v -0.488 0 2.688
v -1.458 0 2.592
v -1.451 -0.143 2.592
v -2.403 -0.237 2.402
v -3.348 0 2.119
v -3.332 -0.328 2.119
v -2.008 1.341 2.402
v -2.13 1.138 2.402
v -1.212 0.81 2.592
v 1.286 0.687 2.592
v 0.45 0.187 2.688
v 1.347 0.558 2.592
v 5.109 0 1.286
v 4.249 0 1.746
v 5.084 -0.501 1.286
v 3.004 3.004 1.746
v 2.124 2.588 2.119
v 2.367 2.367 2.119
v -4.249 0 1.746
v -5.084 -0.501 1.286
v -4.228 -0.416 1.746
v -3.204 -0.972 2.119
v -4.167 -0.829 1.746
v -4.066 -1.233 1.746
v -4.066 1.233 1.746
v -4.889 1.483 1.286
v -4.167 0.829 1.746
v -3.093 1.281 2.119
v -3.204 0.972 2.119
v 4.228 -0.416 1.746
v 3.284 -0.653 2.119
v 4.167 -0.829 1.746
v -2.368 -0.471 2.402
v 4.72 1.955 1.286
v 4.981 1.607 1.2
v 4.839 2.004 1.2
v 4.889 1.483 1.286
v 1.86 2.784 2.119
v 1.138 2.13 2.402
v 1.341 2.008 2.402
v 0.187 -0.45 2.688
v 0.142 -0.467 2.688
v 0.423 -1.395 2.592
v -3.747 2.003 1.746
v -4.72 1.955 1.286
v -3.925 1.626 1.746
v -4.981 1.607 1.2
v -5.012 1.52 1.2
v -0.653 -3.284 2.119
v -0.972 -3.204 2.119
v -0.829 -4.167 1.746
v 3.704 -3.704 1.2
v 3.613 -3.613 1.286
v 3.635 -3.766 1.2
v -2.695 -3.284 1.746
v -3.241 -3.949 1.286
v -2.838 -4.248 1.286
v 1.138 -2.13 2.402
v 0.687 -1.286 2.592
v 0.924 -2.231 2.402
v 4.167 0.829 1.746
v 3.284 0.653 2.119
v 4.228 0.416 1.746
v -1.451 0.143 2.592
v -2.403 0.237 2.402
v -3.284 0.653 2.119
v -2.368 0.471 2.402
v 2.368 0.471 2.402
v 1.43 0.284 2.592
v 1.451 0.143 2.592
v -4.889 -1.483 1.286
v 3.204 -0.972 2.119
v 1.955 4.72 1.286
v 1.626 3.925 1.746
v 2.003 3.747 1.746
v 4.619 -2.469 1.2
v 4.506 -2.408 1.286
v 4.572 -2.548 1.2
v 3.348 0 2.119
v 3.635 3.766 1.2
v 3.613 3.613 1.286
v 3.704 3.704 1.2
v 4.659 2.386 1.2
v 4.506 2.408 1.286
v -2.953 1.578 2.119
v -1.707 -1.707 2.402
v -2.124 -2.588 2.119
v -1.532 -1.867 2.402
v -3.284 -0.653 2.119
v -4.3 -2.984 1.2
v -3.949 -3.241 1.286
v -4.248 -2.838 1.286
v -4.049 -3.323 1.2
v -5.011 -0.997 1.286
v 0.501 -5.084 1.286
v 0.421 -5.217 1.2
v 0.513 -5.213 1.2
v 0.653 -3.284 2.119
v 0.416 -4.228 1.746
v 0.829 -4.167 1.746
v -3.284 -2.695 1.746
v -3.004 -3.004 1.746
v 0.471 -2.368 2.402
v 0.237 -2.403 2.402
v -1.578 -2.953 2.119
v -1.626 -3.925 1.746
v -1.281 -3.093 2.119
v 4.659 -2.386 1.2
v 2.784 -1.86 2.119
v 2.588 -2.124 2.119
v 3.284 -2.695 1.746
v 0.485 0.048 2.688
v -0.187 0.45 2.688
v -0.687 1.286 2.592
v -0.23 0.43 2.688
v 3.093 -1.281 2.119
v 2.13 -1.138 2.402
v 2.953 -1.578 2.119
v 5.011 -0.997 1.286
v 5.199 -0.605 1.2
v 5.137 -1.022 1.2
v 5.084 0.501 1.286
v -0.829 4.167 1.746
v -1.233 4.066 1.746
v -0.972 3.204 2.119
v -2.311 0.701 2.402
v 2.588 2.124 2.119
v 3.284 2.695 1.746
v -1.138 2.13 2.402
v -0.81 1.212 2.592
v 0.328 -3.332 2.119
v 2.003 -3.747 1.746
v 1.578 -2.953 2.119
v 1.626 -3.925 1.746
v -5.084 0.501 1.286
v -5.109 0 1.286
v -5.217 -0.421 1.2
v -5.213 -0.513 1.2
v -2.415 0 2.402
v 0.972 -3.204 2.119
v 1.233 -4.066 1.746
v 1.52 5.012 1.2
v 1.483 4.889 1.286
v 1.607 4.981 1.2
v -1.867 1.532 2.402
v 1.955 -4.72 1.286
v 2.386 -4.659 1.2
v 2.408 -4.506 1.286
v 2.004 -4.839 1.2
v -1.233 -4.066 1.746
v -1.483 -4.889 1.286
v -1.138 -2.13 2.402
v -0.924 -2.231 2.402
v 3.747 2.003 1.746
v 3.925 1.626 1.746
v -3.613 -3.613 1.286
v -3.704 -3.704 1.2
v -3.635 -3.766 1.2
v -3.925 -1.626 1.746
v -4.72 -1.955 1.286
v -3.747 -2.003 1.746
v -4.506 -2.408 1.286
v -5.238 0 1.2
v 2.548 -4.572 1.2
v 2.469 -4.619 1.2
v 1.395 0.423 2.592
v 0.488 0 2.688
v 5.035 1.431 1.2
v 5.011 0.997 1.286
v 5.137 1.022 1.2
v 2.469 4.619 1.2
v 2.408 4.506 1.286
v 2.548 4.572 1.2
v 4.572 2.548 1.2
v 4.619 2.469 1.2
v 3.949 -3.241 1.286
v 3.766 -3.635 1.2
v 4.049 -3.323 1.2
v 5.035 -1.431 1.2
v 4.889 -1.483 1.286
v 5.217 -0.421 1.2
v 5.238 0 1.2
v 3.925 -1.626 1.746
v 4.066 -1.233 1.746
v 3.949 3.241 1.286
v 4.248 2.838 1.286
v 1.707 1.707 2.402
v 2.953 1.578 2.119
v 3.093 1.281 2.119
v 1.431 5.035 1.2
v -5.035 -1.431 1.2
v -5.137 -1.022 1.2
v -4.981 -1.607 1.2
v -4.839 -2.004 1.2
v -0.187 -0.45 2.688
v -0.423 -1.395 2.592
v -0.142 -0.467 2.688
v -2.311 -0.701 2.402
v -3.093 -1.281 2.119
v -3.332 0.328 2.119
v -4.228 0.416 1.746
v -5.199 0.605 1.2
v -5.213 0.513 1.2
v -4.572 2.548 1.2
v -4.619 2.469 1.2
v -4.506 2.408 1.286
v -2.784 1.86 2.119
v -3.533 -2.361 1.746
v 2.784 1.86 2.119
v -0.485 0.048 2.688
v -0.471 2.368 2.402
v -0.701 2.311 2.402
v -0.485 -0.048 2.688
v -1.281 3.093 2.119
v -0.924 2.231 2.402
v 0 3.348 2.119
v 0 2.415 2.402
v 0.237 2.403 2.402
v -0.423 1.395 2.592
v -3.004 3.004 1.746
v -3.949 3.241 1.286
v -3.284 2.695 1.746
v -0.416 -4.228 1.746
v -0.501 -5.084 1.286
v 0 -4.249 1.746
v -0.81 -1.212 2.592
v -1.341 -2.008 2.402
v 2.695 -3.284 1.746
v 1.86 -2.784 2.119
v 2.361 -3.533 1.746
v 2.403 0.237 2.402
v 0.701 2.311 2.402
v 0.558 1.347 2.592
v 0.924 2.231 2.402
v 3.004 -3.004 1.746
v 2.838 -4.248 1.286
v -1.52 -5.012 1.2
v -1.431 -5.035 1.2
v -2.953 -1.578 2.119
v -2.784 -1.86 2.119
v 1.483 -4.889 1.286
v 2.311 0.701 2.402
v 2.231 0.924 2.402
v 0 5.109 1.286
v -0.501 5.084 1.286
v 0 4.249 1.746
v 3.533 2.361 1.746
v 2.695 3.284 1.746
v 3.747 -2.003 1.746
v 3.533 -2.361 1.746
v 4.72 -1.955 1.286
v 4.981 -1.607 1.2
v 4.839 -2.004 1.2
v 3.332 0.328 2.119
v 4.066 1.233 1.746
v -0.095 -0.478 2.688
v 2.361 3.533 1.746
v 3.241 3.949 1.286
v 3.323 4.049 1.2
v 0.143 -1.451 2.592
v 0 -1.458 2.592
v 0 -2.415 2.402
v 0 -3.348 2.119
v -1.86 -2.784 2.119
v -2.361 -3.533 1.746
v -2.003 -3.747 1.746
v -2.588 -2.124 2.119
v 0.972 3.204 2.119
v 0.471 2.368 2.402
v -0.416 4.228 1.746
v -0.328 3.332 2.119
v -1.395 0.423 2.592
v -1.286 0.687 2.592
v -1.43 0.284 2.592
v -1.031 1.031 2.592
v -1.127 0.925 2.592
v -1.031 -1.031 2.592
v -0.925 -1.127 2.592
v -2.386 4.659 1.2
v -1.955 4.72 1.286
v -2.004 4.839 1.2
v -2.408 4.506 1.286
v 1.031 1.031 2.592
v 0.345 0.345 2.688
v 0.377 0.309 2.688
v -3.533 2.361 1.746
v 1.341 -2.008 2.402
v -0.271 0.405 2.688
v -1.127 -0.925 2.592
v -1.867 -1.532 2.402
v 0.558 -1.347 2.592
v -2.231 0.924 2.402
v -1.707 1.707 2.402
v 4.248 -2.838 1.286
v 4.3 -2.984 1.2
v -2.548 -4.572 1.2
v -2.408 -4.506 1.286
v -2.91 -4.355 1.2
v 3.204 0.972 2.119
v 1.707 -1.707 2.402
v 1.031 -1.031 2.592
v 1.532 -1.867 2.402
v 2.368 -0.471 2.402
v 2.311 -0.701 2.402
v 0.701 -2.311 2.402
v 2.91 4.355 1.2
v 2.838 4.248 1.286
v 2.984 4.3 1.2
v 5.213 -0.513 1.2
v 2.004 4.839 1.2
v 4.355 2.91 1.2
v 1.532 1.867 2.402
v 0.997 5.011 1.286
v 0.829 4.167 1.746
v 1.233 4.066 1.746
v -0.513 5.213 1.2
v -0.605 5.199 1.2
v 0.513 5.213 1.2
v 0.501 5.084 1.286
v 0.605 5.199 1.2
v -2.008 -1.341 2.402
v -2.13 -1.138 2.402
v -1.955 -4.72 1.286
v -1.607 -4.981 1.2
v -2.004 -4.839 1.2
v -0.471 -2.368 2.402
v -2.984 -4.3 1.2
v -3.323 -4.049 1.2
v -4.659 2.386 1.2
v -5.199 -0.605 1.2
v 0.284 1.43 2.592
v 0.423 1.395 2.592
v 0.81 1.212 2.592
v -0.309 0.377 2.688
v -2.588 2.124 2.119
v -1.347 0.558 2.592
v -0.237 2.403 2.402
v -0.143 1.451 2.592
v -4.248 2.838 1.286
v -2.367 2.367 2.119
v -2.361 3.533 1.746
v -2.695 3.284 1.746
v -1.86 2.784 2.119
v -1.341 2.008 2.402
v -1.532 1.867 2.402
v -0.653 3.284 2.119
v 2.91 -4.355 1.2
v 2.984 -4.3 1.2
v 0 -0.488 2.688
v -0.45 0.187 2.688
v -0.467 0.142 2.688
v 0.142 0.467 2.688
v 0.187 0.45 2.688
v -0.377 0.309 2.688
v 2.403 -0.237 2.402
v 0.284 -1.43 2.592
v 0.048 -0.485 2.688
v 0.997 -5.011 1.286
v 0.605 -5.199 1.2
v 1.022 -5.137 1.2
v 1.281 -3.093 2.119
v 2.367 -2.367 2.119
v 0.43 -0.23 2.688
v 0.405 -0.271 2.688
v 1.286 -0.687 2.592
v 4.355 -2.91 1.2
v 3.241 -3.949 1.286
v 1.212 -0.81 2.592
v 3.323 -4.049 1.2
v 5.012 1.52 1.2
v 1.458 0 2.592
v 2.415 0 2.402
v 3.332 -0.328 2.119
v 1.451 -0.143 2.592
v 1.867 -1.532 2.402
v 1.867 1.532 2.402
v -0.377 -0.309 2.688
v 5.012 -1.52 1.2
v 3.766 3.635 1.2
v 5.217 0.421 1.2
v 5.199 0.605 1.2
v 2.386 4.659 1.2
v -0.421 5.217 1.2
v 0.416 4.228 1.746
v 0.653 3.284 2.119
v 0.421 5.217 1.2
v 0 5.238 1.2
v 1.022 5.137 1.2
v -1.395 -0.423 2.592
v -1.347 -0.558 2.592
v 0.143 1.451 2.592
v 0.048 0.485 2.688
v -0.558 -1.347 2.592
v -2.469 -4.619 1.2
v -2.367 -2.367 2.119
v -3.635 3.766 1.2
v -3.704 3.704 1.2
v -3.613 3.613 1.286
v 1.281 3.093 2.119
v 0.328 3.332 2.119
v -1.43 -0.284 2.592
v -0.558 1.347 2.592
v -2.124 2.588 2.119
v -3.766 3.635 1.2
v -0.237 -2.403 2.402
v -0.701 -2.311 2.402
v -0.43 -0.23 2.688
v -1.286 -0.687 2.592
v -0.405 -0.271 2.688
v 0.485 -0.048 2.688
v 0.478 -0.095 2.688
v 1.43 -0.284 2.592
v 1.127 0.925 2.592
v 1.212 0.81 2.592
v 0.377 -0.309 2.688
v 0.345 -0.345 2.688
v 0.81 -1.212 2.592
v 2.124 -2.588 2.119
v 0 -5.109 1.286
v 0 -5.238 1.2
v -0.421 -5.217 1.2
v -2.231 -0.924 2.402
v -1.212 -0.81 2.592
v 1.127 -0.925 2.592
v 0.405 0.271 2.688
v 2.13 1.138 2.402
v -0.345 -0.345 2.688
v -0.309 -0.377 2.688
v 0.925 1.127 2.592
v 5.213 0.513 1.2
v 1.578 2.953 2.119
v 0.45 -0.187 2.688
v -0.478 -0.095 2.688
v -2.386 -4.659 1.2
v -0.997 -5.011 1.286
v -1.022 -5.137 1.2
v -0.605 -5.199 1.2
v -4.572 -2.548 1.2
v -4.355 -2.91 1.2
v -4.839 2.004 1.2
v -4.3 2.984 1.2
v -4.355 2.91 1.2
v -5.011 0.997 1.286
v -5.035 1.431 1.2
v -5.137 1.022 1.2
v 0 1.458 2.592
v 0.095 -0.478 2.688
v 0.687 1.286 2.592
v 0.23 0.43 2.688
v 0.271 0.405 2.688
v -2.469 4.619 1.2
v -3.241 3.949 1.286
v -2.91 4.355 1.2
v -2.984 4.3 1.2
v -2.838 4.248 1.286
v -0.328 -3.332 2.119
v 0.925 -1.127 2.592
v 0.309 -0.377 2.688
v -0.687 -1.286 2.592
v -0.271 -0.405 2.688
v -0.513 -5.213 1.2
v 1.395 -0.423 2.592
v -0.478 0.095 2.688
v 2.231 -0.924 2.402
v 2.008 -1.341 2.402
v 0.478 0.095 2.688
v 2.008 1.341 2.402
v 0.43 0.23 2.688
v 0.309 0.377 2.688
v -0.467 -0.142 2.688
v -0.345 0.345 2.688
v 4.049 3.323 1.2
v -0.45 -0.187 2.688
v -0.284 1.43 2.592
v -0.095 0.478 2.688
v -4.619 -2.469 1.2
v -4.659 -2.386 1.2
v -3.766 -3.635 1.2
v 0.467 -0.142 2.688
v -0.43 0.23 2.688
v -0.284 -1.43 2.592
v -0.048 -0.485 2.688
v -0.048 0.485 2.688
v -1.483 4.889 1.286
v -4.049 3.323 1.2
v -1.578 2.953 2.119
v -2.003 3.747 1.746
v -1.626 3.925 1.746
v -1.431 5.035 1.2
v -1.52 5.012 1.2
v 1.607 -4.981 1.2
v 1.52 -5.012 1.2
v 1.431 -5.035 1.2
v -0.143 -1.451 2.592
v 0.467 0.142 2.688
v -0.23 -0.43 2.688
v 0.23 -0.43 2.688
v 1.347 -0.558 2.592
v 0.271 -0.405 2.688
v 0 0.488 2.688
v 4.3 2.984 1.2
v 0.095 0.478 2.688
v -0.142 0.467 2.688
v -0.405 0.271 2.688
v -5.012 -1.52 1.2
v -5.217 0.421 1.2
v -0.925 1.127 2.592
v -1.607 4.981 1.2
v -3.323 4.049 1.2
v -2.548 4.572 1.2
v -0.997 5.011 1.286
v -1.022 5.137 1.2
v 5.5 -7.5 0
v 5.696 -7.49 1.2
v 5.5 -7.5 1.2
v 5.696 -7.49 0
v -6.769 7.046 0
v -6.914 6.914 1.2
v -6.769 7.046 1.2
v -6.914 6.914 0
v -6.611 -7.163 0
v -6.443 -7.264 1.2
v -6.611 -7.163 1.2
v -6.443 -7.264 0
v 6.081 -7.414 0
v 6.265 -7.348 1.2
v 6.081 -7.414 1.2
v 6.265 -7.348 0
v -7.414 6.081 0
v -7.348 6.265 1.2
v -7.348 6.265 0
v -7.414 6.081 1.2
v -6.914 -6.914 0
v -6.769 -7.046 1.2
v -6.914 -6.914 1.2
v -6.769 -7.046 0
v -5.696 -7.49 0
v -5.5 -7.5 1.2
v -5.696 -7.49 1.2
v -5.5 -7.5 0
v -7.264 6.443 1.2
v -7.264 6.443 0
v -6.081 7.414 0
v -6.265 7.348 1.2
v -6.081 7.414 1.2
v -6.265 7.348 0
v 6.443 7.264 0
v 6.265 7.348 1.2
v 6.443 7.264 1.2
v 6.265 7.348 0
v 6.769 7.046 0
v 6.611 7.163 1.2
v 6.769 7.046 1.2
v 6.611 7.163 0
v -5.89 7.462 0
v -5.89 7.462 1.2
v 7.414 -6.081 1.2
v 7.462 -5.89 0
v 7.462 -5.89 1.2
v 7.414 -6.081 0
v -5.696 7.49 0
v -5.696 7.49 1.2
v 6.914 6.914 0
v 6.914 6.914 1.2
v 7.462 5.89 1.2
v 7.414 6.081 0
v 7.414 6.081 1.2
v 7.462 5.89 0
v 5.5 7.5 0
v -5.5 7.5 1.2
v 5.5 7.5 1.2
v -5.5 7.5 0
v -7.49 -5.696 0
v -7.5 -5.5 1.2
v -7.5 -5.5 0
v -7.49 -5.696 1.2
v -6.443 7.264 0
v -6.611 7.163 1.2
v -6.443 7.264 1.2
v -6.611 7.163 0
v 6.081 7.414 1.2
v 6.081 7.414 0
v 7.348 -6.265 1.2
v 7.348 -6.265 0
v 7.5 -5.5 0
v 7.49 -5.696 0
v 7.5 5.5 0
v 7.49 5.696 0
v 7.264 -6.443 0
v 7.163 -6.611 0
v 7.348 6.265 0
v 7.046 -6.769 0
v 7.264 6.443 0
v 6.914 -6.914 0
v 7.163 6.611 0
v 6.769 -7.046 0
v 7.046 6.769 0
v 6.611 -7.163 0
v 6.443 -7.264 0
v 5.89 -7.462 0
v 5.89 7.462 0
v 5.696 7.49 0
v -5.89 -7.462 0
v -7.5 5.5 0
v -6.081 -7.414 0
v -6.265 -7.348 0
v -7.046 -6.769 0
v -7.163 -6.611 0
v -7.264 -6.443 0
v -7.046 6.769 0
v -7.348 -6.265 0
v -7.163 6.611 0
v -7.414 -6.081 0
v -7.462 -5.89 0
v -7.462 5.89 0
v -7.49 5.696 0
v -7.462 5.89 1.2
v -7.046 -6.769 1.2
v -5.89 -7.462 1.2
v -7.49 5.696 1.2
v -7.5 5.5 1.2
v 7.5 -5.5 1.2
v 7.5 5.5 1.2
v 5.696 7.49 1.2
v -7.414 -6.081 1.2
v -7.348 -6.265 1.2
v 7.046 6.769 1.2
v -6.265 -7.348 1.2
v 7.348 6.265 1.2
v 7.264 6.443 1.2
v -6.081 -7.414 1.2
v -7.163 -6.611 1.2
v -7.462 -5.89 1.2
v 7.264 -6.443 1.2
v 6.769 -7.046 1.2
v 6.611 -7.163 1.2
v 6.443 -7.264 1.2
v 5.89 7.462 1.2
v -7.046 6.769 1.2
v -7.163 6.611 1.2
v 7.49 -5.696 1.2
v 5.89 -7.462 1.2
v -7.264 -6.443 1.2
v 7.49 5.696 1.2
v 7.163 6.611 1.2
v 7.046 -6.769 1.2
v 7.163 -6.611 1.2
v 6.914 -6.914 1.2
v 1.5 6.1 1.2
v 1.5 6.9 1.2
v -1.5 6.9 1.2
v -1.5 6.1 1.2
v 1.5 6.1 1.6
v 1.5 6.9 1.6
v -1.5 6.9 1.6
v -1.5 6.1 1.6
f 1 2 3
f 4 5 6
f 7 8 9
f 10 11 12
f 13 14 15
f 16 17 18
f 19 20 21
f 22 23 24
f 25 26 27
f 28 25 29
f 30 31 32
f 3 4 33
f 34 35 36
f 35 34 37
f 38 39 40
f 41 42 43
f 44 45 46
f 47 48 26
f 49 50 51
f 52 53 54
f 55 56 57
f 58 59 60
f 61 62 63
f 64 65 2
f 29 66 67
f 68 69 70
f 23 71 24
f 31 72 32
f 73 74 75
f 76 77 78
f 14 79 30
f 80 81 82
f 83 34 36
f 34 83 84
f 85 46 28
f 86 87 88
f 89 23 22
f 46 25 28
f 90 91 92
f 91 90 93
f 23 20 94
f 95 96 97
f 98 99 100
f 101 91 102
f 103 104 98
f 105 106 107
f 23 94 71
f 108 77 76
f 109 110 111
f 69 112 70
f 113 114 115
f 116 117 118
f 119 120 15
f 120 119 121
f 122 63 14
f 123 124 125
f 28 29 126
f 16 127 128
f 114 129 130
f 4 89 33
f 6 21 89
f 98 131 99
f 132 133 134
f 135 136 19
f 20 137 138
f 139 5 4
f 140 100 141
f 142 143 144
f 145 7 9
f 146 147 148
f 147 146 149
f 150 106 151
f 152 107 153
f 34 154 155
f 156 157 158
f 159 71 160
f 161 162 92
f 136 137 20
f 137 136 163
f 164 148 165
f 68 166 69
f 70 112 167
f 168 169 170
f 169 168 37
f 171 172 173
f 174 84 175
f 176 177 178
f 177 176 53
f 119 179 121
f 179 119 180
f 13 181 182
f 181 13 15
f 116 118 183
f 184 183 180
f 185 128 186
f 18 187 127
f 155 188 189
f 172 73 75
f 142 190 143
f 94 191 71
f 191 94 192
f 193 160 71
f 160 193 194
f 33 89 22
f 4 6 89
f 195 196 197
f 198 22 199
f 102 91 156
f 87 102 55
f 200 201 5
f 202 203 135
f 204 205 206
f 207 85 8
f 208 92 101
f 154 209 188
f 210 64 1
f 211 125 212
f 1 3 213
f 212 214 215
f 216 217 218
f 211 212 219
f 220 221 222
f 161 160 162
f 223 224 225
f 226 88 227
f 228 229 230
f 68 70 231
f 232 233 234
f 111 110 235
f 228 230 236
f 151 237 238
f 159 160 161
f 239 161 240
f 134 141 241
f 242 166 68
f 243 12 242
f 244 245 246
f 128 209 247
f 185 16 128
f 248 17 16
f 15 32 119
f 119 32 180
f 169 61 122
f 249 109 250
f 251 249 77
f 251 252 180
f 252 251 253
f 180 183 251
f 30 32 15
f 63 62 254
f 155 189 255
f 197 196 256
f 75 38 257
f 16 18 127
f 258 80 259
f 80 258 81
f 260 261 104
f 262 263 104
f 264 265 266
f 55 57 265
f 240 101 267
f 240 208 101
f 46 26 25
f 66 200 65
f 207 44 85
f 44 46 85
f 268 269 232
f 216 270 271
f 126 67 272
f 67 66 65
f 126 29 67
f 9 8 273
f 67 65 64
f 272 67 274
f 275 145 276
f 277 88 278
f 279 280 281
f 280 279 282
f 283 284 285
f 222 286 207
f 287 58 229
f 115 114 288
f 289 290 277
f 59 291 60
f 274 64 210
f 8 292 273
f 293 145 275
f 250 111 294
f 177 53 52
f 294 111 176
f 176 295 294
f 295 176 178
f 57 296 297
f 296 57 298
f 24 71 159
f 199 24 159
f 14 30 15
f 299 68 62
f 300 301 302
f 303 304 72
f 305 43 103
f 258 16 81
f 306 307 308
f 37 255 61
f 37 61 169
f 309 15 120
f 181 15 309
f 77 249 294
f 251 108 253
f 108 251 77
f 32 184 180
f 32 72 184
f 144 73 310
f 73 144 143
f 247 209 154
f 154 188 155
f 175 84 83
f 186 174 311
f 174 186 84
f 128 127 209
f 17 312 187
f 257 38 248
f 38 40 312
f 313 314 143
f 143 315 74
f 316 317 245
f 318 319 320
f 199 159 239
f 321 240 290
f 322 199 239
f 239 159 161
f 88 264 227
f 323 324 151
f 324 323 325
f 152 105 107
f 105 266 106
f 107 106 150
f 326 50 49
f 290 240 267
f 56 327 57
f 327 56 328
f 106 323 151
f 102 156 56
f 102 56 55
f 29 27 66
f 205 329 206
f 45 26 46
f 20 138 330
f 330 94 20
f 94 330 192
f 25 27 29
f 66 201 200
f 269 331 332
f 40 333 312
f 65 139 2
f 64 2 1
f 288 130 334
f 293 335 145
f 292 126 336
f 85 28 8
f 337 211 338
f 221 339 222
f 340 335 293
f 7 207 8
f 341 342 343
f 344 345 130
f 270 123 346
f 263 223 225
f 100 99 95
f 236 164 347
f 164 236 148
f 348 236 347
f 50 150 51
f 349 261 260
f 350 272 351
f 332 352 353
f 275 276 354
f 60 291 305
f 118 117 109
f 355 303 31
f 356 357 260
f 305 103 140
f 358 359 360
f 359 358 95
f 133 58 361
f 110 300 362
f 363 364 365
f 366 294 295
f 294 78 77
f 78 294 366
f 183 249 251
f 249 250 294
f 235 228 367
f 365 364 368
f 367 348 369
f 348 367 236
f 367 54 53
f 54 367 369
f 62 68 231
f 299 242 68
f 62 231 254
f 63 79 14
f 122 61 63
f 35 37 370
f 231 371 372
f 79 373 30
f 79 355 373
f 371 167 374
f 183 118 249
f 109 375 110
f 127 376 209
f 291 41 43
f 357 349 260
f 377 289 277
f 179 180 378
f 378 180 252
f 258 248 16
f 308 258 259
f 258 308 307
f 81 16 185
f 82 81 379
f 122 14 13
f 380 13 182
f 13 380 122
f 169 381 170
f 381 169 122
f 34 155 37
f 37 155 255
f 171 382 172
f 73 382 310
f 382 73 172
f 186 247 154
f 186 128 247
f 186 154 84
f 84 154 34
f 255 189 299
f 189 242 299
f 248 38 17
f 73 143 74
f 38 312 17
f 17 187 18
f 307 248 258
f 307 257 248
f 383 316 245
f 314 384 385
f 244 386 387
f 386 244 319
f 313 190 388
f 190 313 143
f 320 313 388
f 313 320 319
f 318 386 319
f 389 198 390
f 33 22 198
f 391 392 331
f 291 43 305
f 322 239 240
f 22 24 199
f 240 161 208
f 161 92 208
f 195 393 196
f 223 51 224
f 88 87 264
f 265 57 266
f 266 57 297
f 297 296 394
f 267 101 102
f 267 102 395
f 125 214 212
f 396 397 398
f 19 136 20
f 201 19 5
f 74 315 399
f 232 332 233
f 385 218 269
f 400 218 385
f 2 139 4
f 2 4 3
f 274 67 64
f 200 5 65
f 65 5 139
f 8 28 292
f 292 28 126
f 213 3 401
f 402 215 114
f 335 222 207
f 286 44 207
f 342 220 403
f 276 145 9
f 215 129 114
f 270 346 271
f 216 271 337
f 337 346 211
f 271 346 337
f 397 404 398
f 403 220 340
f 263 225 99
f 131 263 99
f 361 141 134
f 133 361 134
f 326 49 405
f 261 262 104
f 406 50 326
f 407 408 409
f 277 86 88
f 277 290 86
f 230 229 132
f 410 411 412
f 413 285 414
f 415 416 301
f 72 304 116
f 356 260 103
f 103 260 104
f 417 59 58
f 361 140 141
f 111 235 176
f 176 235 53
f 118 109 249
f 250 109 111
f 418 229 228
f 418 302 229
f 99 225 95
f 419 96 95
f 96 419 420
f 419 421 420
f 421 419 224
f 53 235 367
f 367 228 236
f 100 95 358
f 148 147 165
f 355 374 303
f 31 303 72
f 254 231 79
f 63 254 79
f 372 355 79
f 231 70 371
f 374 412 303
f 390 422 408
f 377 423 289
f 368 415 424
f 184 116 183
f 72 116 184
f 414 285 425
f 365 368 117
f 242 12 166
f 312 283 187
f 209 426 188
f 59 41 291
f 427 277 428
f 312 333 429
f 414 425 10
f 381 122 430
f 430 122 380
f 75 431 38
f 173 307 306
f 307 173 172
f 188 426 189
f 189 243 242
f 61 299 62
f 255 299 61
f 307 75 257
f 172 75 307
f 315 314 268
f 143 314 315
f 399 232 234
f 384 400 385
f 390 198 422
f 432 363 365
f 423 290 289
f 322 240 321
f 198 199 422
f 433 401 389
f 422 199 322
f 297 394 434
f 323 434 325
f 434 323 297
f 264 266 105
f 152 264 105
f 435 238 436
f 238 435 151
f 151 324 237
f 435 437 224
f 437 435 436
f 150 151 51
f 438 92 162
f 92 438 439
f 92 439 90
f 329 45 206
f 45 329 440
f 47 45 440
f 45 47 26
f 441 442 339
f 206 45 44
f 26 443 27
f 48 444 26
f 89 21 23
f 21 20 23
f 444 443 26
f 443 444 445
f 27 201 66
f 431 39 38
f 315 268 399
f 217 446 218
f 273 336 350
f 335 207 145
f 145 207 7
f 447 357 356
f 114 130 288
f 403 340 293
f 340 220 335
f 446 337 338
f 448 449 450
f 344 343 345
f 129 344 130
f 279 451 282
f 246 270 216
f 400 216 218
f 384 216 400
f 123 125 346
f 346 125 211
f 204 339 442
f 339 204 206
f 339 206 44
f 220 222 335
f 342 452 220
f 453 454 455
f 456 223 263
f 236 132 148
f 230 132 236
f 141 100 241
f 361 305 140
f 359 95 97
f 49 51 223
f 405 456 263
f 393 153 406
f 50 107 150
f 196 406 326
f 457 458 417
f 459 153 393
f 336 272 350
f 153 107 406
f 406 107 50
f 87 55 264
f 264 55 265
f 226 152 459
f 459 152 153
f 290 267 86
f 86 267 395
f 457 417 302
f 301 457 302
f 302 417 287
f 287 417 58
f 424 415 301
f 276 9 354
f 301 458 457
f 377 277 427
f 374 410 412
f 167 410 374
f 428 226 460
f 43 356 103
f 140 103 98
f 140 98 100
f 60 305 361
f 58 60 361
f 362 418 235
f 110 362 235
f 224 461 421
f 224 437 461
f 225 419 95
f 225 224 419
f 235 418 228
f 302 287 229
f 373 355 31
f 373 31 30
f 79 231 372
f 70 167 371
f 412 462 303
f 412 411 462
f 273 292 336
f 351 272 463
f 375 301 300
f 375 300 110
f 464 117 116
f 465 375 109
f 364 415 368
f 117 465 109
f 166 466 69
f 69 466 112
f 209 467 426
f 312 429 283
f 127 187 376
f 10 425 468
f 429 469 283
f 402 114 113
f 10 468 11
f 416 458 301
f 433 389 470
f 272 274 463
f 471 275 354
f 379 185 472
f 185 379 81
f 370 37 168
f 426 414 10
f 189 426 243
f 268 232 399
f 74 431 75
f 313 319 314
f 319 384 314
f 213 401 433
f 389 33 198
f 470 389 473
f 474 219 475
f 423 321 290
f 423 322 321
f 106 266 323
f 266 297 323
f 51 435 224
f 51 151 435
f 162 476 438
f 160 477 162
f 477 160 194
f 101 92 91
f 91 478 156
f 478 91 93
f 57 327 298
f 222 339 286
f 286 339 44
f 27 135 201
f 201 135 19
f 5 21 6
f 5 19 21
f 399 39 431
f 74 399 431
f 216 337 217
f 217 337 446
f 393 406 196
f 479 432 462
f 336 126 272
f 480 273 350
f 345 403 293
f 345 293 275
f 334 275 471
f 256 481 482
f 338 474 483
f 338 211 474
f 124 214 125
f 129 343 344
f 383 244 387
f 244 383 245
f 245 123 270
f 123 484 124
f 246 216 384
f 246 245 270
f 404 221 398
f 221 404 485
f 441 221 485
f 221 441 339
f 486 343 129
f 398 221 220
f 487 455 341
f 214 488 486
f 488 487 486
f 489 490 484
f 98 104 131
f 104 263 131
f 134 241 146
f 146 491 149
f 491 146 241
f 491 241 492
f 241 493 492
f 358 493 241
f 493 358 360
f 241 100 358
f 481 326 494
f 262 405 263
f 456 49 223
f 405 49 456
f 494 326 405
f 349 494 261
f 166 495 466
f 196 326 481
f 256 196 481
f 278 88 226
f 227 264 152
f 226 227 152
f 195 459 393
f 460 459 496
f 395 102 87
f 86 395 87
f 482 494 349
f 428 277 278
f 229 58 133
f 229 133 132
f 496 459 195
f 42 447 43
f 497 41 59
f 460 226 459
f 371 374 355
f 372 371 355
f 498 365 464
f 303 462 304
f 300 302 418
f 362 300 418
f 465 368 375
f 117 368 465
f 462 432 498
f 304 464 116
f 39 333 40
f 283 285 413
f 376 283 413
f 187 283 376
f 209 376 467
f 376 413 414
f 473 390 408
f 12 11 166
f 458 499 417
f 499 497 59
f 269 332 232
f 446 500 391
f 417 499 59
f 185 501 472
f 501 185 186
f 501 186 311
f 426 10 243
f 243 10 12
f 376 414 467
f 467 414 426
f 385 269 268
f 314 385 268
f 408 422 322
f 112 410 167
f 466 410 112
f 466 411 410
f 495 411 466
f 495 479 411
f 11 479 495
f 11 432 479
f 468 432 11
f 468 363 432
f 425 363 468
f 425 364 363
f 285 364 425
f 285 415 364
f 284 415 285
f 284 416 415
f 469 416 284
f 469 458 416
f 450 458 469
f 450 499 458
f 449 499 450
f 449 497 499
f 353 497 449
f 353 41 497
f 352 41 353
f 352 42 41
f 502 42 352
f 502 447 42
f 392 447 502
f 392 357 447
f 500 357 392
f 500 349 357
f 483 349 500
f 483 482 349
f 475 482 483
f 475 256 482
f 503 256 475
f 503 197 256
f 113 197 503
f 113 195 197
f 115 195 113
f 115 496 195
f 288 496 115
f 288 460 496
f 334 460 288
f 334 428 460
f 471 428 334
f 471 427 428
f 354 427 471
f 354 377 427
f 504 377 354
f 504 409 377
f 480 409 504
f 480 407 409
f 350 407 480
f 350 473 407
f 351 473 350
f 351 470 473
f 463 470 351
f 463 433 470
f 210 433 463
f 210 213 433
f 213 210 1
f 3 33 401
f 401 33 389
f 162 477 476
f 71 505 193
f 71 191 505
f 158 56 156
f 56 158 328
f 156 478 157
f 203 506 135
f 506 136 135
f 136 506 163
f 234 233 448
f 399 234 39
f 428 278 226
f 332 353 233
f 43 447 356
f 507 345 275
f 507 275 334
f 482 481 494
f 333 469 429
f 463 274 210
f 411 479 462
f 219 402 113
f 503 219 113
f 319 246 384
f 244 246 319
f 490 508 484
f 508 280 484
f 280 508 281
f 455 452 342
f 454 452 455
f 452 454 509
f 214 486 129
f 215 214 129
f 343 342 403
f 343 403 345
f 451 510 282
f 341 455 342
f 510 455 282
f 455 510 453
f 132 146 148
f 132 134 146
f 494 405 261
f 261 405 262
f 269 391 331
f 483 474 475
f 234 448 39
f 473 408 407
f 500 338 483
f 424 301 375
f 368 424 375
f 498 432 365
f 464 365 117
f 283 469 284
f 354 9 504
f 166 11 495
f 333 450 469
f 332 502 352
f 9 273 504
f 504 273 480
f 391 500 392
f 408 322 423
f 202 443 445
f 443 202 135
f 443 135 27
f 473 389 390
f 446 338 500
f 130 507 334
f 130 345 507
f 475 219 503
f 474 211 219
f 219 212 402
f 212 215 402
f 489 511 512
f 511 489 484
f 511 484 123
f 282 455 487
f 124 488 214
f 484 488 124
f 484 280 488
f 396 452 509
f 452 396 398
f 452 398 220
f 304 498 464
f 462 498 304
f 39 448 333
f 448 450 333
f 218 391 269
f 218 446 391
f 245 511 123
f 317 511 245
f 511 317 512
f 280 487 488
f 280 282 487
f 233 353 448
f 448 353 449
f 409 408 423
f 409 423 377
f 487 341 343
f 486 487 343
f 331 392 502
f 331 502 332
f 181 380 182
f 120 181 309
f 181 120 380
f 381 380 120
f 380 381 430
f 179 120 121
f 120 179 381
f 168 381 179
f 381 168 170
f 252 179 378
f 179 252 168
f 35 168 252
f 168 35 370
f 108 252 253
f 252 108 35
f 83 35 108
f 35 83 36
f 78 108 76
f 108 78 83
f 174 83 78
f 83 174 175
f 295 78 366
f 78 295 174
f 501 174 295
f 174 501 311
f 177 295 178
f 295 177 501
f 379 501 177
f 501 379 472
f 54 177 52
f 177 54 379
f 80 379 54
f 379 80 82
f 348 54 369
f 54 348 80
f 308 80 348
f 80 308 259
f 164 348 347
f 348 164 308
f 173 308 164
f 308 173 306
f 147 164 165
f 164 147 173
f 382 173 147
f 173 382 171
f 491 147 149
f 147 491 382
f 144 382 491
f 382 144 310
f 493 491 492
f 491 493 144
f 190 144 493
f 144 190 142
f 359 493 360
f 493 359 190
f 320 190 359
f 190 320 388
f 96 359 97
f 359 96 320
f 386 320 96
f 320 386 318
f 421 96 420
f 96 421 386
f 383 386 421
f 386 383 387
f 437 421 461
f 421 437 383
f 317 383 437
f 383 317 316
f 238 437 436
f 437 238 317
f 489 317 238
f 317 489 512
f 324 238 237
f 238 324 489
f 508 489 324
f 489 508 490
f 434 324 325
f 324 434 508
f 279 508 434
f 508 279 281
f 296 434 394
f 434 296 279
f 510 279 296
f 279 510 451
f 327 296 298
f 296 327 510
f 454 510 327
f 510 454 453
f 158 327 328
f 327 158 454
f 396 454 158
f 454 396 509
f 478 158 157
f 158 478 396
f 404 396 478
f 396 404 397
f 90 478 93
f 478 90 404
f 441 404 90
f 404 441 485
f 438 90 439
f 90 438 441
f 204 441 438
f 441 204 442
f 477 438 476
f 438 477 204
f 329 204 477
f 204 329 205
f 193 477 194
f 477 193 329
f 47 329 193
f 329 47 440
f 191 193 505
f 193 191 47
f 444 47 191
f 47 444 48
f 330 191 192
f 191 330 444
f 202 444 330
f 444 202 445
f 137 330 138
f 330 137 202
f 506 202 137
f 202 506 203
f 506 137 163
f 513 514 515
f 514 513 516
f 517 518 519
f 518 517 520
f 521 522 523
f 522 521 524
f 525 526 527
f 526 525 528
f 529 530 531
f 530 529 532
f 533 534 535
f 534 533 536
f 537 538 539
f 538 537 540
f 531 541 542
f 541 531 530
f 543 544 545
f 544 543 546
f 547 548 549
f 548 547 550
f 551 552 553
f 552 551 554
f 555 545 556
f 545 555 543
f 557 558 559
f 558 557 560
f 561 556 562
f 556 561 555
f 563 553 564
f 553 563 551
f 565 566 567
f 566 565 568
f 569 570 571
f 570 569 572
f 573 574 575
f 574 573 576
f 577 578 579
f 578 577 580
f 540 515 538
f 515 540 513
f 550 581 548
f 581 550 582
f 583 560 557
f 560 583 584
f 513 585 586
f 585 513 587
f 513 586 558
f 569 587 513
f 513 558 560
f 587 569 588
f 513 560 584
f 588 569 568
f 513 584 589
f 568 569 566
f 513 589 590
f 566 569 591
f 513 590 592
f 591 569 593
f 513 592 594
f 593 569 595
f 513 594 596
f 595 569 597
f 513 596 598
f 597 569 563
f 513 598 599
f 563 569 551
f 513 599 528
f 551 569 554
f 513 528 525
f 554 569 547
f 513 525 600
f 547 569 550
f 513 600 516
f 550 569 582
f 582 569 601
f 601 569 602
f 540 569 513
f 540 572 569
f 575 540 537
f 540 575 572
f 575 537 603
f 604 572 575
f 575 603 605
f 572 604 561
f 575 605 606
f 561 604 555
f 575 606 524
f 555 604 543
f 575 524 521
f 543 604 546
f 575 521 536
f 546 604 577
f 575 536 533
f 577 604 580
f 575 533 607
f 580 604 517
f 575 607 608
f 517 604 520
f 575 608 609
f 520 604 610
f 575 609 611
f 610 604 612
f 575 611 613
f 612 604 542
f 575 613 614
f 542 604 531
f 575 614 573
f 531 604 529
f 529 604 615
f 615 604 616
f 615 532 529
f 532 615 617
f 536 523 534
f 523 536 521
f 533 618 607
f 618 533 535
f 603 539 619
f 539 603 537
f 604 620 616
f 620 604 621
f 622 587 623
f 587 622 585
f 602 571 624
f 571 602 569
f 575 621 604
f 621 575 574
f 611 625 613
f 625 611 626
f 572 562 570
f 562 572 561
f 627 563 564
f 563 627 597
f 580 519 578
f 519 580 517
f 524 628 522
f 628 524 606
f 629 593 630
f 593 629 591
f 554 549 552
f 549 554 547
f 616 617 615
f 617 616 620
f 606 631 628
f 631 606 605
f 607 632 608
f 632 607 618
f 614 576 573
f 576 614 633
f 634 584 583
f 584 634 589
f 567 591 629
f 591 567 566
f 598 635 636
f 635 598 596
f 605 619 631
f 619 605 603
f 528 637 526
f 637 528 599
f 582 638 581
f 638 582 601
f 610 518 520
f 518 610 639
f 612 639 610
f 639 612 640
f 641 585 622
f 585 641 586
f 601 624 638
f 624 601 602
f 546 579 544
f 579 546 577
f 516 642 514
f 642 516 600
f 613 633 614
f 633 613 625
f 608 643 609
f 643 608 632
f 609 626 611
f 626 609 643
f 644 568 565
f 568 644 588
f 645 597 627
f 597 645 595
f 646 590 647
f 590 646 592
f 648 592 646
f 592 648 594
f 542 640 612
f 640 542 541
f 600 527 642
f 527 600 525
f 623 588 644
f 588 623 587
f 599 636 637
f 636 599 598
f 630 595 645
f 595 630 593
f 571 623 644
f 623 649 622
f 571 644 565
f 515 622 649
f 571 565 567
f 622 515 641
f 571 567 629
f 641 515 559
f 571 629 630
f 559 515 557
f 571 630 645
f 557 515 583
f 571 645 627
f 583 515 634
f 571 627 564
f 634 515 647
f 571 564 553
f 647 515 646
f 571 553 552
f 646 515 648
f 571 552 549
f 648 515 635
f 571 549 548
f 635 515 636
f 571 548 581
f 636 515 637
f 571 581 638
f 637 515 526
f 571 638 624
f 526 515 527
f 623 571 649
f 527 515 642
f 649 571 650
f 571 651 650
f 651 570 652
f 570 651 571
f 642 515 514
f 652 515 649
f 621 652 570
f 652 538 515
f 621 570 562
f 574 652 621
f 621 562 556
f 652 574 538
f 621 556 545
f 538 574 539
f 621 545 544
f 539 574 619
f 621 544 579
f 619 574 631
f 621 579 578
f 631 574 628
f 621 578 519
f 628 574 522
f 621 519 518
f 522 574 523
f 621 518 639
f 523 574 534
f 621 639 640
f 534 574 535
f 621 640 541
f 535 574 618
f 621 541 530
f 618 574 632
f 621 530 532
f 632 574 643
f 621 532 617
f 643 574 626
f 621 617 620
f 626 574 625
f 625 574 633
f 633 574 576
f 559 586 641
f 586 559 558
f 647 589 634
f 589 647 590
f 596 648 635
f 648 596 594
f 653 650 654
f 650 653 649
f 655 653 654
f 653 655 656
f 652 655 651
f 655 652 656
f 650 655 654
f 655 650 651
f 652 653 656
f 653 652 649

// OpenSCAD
// SPARSH tactile caps - OpenSCAD version of hardware/make_caps.py (same parameters)
// Open in OpenSCAD, pick SYMBOL and VARIANT, F6 to render, File > Export STL.
// All units mm. MEASURE YOUR ROCKER with calipers before printing the sleeve variant.

SYMBOL  = "dot";    // v1 vocabulary: "dot" (light) | "cross" (fan) | "triangle" (socket) | "square" (other); pilot extras: "line" "ring" "double_dot"
VARIANT = "tile";   // "tile" (adhesive) | "sleeve" (friction fit)

TILE = 15; BASE_T = 1.2; CORNER_R = 2; S = 10.5;
ROCKER_W = 16.5; ROCKER_H = 27.0; FIT = 0.15; WALL = 1.0; SLEEVE_DEPTH = 3.2;
function relief(n) = n=="dot"?1.5 : n=="line"?1.0 : n=="triangle"?1.25 : n=="ring"?0.8 : n=="cross"?1.1 : n=="double_dot"?1.3 : 0.9;
$fn = 64;

module rrect(w,h,r,t){ linear_extrude(t) offset(r) square([w-2*r,h-2*r],center=true); }
module dome(r,h){ R=(r*r+h*h)/(2*h); intersection(){ translate([0,0,h-R]) sphere(R); translate([-R,-R,0]) cube([2*R,2*R,h]); } }

module symbol(n){
  h = relief(n);
  if (n=="dot") dome(S*0.5,h);
  else if (n=="double_dot") { translate([-S*0.27,0,0]) dome(S*0.24,h); translate([S*0.27,0,0]) dome(S*0.24,h); }
  else if (n=="line") linear_extrude(h) offset(1.25) square([S-2.5,0.01],center=true);
  else if (n=="triangle") linear_extrude(h) offset(0.5) offset(-0.5) circle(r=S*0.58,$fn=3);
  else if (n=="ring") linear_extrude(h) difference(){ circle(S/2); circle(S/2-1.8); }
  else if (n=="cross") linear_extrude(h) union(){ square([S,2.2],center=true); square([2.2,S],center=true); }
  else linear_extrude(h) offset(1) square([S*0.95-2,S*0.95-2],center=true);
}

module tile(n){
  rrect(TILE,TILE,CORNER_R,BASE_T);
  translate([0,0,BASE_T]) symbol(n);
  if (n!="triangle") translate([-1.5,TILE/2-1.4,BASE_T]) cube([3,0.8,0.4]); // orientation tick (top edge)
}

module sleeve(n){
  iw=ROCKER_W+2*FIT; ih=ROCKER_H+2*FIT;
  difference(){ rrect(iw+2*WALL, ih+2*WALL, 1.5, SLEEVE_DEPTH+BASE_T); translate([0,0,-0.01]) rrect(iw,ih,1,SLEEVE_DEPTH+0.01); }
  translate([0, ih*0.22, SLEEVE_DEPTH+BASE_T]) symbol(n);
}

if (VARIANT=="tile") tile(SYMBOL); else sleeve(SYMBOL);
